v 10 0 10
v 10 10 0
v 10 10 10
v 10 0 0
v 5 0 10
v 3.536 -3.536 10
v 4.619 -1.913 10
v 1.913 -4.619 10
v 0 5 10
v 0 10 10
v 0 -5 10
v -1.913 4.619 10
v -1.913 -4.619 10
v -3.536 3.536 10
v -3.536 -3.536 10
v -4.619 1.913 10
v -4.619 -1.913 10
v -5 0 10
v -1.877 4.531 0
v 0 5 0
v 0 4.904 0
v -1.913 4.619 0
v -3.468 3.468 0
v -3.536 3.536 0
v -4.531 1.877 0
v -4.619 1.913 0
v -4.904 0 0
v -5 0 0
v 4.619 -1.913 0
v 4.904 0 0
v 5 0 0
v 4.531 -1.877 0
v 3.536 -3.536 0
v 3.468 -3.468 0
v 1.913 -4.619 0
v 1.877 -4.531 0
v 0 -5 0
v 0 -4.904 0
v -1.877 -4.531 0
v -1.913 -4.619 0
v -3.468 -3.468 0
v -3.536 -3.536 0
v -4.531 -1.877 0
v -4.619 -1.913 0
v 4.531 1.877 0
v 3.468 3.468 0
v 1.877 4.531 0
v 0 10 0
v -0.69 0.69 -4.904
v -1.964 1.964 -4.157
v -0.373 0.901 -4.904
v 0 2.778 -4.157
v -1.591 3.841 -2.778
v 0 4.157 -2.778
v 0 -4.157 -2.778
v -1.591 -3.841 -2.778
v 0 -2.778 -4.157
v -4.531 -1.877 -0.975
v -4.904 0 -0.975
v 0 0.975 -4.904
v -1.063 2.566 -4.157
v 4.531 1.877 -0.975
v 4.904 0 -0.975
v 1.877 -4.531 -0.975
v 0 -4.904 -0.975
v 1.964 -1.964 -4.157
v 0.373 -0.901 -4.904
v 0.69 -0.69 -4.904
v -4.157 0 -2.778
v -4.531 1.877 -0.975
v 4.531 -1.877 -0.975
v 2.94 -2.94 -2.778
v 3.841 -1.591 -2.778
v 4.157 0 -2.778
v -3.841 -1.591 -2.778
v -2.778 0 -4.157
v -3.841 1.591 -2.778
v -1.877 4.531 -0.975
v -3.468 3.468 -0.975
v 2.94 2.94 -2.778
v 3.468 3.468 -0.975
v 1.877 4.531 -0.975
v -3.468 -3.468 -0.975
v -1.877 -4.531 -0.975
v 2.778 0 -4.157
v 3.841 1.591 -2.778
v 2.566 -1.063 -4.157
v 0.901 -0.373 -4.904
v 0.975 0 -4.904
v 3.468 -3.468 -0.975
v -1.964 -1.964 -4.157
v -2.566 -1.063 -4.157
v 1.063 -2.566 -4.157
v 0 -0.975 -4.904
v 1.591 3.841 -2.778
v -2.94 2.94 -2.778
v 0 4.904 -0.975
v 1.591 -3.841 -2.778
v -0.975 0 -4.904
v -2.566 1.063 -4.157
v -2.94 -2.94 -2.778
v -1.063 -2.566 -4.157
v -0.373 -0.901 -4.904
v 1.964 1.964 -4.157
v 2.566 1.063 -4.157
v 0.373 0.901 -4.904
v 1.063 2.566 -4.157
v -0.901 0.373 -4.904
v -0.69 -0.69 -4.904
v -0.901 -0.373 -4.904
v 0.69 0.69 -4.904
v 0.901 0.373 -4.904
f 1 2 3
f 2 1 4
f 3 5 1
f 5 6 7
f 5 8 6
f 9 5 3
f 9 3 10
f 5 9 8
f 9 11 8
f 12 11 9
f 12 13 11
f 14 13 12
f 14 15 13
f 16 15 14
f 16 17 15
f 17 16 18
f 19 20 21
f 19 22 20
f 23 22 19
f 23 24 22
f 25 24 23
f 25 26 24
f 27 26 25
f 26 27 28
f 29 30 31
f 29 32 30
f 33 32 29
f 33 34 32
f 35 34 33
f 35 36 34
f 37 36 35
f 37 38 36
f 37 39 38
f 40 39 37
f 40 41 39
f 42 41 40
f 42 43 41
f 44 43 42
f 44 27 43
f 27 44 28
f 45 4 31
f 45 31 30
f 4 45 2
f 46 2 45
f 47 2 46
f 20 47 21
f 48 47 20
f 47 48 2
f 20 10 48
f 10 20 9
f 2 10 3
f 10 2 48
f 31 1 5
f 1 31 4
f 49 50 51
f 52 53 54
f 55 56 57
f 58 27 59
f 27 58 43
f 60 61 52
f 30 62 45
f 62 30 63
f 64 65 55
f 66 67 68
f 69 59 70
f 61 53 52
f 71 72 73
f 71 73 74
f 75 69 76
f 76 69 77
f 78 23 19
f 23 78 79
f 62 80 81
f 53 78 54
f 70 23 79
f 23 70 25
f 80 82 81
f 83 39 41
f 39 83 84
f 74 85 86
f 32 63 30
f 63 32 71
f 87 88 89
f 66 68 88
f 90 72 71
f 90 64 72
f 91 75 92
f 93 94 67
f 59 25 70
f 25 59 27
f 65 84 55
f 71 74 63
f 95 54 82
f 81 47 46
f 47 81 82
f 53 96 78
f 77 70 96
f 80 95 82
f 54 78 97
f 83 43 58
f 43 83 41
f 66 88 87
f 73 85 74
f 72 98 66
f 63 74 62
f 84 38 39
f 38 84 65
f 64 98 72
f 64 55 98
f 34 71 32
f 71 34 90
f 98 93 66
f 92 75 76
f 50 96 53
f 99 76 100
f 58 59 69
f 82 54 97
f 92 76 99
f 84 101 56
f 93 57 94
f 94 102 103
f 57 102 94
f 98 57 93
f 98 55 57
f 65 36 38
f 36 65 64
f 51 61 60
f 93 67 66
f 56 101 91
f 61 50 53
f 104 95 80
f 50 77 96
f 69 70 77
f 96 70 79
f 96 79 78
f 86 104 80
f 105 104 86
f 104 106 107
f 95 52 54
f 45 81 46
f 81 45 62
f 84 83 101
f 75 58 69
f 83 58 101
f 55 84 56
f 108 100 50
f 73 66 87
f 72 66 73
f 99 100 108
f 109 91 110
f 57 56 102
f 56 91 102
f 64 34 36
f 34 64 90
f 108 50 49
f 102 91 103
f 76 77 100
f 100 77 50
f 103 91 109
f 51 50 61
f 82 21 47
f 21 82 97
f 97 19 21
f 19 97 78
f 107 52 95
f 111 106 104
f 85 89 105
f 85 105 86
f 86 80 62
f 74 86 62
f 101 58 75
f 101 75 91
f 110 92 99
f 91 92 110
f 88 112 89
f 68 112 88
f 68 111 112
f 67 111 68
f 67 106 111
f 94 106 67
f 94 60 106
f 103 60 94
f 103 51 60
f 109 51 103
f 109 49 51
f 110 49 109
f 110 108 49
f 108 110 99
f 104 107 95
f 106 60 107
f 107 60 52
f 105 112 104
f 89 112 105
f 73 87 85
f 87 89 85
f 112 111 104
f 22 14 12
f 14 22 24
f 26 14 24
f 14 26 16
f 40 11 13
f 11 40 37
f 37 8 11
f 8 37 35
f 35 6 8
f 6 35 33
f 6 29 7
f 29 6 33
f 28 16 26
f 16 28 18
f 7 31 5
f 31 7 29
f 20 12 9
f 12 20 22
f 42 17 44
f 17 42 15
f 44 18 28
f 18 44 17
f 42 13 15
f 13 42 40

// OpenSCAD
cube(10);
// This comment should stay on its own line

sphere(5);
// Another comment

// Block comment
cylinder(h = 10, r = 5);
